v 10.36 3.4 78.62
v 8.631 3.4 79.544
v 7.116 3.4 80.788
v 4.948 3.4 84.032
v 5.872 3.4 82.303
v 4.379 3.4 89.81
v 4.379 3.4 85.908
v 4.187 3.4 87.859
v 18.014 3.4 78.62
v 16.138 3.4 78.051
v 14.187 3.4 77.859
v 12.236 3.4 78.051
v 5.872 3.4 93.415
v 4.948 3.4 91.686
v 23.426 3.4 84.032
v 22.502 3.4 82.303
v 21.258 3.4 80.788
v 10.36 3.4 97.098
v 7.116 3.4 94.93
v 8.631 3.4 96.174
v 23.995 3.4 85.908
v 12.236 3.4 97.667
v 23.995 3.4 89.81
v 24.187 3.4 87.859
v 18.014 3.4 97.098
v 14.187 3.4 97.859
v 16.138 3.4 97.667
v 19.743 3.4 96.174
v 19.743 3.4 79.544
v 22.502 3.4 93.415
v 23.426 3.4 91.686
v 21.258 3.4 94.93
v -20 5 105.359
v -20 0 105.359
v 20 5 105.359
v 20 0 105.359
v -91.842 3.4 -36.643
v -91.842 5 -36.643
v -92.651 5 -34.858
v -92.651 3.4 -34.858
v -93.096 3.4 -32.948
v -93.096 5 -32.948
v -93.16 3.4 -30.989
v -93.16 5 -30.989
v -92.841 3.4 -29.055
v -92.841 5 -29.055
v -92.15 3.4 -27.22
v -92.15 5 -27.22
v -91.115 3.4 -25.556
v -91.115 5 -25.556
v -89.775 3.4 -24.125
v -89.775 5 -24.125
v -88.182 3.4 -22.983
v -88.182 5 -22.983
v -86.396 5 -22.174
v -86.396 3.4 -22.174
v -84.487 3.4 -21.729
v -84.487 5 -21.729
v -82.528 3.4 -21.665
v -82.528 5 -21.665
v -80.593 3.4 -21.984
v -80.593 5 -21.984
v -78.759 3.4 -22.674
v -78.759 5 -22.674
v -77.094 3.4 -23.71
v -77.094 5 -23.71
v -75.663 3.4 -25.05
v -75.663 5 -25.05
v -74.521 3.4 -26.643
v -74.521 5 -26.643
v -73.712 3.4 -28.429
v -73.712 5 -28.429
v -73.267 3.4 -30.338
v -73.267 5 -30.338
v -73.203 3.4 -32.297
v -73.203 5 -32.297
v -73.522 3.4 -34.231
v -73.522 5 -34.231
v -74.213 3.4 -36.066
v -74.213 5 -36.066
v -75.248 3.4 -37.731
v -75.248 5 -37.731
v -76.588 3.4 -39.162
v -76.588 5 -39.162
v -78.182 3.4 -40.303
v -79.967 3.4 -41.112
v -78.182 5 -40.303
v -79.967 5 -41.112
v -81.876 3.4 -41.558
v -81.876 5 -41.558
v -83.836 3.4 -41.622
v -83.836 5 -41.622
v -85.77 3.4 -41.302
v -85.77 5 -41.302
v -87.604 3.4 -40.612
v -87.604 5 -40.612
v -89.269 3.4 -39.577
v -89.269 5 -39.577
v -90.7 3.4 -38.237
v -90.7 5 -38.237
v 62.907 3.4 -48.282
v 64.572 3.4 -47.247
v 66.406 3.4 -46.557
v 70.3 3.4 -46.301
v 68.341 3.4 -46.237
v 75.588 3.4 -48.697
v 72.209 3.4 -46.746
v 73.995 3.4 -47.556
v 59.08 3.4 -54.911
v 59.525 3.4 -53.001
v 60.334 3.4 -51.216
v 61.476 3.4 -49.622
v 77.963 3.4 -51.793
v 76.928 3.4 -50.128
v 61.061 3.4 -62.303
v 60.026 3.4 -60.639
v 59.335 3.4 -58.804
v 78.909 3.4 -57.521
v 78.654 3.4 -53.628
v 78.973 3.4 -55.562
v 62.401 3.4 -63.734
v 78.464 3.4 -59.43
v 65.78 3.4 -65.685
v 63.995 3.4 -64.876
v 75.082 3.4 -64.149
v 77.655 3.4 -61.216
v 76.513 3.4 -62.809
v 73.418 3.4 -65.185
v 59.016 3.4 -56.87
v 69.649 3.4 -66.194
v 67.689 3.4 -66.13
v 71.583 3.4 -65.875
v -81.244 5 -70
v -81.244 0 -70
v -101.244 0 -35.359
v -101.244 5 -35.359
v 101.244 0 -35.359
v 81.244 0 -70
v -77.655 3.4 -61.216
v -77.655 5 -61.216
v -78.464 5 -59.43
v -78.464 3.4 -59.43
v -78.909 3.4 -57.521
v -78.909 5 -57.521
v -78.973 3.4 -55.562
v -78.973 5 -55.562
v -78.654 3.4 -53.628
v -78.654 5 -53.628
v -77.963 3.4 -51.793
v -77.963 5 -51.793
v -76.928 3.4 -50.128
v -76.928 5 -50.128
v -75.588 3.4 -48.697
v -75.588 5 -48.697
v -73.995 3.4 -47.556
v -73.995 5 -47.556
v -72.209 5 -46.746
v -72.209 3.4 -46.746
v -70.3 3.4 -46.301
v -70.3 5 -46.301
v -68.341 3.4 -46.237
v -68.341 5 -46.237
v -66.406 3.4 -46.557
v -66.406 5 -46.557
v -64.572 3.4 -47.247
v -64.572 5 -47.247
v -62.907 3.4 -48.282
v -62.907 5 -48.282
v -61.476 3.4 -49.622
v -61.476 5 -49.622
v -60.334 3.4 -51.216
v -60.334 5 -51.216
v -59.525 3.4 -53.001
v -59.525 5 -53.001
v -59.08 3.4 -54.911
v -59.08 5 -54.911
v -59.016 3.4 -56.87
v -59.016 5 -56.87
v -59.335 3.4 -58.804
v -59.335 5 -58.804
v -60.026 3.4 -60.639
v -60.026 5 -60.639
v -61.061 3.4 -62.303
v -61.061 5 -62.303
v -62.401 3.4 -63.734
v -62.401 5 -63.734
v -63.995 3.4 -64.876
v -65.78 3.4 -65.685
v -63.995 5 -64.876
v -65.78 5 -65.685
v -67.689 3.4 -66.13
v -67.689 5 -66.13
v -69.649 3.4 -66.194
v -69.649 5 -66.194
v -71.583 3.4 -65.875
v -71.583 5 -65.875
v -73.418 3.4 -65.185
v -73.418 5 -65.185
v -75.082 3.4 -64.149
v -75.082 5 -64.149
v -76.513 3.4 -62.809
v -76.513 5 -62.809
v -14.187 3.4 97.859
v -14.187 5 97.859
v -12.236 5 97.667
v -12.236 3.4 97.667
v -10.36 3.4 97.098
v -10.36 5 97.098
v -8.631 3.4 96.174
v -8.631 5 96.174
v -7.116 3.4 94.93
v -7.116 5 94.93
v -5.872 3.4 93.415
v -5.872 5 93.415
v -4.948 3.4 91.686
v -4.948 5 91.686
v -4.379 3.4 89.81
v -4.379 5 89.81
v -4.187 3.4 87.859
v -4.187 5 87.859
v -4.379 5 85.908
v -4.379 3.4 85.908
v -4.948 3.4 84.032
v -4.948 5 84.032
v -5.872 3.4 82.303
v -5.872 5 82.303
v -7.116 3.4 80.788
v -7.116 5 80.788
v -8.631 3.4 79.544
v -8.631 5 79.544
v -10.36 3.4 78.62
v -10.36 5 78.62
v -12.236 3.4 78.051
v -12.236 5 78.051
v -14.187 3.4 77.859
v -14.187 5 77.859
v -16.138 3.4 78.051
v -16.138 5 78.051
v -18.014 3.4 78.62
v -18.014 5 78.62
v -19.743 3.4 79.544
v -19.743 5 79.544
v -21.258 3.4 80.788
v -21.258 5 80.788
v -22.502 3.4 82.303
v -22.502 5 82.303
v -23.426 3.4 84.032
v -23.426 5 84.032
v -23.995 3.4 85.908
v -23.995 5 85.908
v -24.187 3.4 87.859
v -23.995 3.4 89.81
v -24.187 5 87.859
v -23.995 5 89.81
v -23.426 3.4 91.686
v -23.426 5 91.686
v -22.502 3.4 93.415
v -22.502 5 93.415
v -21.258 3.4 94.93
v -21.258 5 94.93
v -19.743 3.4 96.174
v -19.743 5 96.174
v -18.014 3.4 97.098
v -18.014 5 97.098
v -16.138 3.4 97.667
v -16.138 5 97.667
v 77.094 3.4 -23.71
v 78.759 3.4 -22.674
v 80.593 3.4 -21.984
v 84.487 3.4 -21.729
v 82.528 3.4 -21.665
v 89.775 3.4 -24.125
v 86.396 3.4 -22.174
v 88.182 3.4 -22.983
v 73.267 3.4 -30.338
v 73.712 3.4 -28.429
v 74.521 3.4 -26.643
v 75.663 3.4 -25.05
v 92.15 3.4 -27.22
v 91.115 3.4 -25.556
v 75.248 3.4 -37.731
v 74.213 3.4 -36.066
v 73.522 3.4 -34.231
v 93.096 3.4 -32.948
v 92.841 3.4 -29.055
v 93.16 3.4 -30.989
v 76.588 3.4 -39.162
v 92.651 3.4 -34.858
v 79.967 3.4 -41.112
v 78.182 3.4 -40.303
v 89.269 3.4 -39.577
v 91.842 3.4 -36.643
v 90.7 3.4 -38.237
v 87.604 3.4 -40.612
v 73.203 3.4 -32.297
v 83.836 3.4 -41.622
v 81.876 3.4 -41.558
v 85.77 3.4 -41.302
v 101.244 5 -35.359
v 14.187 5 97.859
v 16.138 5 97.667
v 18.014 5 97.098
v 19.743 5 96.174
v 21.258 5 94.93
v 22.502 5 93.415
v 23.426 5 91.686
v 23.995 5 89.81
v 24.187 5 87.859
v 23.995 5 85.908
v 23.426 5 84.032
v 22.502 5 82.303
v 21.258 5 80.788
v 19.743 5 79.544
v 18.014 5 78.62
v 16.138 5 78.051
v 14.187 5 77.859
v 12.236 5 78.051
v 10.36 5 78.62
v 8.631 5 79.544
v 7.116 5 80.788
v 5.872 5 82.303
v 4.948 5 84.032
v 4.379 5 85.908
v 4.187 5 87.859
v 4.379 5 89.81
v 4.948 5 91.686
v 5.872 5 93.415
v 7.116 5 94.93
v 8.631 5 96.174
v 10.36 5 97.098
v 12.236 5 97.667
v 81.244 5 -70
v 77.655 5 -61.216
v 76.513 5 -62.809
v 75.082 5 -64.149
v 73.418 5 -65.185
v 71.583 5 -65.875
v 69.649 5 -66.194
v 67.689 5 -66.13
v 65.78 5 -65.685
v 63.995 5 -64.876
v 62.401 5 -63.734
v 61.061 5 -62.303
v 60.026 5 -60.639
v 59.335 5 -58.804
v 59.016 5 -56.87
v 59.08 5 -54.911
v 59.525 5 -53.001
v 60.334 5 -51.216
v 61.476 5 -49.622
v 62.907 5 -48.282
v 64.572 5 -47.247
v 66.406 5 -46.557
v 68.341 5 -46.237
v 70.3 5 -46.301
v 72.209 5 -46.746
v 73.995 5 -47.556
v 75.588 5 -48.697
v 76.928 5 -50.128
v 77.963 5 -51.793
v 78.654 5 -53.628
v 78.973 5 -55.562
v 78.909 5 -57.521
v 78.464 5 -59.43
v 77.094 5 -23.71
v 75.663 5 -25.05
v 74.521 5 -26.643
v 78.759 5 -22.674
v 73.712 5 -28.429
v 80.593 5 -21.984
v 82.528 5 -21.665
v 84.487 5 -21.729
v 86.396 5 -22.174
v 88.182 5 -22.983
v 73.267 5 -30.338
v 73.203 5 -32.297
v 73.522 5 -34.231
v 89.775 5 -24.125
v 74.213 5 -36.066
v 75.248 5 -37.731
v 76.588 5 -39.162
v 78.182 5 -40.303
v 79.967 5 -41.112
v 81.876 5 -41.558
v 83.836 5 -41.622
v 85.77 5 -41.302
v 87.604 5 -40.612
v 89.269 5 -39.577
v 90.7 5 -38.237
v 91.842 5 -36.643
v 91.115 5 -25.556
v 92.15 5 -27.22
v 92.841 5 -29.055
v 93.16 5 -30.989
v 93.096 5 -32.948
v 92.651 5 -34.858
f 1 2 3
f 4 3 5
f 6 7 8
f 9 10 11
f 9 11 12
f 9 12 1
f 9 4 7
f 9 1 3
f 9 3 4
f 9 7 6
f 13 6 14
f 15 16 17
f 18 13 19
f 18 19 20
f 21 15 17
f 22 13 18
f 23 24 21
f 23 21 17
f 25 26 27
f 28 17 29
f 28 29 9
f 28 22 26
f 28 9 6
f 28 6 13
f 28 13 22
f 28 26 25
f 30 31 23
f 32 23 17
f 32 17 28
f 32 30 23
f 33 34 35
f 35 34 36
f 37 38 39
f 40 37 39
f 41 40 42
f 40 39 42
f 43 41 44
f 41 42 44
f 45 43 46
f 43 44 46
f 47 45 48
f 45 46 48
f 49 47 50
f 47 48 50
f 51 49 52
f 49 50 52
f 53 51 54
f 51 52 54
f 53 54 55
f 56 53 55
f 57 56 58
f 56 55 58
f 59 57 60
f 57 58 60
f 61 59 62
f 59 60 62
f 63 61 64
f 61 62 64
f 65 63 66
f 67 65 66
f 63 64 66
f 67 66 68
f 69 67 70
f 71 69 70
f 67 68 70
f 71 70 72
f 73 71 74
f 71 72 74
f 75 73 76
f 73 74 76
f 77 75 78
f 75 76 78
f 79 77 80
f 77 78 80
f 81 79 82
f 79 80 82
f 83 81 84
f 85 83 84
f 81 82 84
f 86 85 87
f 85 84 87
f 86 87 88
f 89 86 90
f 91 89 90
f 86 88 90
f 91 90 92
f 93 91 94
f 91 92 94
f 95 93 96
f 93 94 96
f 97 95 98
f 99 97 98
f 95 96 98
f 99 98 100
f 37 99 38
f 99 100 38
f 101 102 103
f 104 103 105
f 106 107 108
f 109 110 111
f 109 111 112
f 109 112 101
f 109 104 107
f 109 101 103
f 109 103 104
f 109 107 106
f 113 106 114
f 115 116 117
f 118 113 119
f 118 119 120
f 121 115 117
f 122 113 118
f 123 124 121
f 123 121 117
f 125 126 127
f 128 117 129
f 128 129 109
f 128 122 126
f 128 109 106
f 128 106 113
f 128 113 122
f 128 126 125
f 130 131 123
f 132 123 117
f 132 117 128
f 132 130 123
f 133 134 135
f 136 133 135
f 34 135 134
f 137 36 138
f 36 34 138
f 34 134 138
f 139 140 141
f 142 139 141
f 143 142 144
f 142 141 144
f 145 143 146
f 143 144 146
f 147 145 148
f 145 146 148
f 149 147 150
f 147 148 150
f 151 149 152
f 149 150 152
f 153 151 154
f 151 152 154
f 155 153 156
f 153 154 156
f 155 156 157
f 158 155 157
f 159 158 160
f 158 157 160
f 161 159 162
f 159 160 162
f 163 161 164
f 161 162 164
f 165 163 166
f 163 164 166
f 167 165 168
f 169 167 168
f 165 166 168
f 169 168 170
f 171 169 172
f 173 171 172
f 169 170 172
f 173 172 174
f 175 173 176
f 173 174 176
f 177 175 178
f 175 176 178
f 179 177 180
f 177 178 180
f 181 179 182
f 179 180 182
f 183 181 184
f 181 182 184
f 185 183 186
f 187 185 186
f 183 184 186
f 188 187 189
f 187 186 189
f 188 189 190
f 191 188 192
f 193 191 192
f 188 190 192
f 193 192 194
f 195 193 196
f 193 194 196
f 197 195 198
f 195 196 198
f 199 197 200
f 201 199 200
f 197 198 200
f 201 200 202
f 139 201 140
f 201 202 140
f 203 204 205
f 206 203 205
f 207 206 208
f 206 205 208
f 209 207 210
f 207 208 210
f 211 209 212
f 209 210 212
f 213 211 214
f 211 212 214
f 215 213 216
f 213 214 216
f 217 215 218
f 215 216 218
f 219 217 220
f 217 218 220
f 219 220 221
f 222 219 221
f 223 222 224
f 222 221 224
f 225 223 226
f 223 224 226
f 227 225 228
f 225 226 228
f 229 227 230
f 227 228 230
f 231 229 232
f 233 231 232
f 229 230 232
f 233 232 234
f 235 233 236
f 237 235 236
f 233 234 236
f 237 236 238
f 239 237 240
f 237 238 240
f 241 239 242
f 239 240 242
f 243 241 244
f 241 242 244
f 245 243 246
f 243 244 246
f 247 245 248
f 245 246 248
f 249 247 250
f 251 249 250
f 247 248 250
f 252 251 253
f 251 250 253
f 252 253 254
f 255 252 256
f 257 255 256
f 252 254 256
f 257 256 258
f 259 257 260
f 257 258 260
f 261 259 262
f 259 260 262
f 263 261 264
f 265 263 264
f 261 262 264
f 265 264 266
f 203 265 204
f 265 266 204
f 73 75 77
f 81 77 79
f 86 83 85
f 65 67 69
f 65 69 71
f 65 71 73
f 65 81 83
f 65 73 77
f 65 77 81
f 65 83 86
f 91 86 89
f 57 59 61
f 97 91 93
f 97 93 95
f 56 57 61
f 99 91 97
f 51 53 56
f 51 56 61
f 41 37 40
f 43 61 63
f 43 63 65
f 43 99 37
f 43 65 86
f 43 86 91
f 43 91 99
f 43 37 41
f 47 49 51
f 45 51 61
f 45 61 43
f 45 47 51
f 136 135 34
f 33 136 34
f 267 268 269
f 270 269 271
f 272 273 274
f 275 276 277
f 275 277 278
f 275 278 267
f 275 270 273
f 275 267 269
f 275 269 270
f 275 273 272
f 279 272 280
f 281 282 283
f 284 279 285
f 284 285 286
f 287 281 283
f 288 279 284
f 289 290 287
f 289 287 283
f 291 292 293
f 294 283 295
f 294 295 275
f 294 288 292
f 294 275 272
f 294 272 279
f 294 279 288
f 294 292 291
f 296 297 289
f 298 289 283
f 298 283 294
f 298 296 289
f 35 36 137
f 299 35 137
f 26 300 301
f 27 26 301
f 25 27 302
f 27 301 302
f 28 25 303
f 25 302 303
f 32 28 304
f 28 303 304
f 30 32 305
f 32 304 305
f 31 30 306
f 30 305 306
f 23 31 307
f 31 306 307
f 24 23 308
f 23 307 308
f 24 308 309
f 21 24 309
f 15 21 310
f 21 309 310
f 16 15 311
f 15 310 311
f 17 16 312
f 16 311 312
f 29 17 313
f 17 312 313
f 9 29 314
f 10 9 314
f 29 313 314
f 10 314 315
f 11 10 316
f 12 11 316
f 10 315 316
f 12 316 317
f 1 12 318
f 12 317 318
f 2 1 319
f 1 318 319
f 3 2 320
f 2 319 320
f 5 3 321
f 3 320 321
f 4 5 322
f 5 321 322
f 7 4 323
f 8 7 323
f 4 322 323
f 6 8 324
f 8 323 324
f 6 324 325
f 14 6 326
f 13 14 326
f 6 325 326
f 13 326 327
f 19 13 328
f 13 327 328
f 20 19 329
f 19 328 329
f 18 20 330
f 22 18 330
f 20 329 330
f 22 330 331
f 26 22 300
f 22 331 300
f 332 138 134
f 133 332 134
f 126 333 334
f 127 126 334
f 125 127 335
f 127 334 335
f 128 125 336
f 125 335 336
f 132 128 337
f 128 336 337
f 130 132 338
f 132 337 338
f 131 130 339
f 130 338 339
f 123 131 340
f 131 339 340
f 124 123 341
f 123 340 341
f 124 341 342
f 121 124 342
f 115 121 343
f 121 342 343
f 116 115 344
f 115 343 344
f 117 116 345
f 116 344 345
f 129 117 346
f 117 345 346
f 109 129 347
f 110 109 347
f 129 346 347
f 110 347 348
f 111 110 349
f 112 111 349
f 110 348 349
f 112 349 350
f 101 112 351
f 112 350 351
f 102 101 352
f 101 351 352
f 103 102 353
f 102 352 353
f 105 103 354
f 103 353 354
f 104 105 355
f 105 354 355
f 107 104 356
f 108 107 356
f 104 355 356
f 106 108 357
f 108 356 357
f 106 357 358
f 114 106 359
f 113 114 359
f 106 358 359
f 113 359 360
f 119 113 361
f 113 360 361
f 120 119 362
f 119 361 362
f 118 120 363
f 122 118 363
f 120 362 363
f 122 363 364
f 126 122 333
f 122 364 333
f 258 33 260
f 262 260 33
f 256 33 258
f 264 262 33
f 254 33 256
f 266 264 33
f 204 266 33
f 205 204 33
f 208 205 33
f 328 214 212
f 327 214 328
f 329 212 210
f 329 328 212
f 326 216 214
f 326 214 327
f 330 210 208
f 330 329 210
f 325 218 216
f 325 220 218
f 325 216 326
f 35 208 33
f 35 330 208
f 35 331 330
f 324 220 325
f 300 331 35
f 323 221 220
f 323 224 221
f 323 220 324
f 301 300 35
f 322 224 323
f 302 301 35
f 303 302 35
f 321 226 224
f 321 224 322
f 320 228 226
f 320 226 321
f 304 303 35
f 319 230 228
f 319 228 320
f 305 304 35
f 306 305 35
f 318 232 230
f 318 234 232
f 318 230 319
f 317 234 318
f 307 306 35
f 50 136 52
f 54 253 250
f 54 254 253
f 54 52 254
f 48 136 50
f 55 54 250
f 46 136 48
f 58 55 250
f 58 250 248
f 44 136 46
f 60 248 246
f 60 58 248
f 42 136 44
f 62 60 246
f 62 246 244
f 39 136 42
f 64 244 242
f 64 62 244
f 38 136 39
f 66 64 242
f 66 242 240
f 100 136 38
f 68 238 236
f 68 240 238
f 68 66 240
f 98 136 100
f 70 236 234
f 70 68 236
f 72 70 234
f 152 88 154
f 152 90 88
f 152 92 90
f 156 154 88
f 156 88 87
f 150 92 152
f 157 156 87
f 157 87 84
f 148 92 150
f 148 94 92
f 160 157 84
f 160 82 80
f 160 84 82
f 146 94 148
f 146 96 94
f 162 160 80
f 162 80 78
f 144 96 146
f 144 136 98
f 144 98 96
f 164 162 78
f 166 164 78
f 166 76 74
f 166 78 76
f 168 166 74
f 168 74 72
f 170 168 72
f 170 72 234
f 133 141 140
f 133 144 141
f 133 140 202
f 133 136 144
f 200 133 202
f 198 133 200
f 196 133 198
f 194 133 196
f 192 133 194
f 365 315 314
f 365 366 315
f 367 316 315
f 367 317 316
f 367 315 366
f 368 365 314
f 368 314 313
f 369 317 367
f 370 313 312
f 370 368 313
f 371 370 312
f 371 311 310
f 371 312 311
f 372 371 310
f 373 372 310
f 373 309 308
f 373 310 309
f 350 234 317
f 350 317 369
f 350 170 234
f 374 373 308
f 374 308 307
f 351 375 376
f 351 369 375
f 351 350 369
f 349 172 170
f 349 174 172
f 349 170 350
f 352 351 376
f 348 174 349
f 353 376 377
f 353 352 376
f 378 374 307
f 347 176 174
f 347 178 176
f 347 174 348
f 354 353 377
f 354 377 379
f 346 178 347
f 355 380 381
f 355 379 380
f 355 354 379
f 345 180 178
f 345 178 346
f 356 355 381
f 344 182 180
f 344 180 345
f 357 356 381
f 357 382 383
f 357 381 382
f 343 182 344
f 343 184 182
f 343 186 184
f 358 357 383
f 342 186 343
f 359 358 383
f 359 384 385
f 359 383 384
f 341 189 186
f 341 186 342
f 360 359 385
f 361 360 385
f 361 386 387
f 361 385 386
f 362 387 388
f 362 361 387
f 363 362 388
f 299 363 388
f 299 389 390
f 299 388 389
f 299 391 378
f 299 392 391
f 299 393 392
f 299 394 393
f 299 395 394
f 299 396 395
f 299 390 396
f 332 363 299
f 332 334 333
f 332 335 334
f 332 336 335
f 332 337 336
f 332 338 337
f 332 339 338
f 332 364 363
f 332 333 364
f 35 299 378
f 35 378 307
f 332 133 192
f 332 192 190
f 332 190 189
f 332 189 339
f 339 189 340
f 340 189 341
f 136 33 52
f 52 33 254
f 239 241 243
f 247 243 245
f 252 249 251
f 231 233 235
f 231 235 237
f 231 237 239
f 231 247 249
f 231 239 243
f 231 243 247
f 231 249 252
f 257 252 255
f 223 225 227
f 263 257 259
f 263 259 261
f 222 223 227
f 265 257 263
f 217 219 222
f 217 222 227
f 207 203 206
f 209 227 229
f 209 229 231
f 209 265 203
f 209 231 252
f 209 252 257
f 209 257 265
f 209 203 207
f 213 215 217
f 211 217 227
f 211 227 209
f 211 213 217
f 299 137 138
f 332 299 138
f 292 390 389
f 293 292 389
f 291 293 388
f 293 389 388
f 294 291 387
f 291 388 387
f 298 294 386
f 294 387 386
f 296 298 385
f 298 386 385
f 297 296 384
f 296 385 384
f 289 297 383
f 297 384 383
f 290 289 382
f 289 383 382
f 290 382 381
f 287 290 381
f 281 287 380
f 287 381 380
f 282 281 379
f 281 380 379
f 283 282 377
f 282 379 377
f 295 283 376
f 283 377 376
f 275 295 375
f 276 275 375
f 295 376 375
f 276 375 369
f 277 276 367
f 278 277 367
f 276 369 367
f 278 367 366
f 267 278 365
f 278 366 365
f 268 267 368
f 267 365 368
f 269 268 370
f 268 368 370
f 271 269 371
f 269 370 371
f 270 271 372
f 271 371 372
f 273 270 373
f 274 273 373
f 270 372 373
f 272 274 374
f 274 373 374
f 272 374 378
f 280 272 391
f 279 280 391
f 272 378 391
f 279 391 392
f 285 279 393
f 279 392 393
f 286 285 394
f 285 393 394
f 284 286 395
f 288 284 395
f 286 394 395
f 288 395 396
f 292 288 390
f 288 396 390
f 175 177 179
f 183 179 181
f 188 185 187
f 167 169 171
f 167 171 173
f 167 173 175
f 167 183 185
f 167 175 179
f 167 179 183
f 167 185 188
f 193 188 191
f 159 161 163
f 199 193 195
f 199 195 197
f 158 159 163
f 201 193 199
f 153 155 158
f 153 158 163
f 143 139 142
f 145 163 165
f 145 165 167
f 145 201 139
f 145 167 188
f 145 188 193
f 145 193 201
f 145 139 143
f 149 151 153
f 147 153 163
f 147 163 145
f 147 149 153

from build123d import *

# Parameters (mm, degrees)
BOSS_EXTRUDE1_DEPTH = 5
CUT_EXTRUDE4_START  = 5
SKETCH1_5_R         = 10
CUT_EXTRUDE4_DEPTH  = 1.6
CIRPATTERN1_COUNT   = 3


with BuildPart() as part:
    # Sketch1 → Boss-Extrude1 (new body)
    with BuildSketch(Plane(origin=(0, 0, 0), x_dir=(1, 0, 0), z_dir=(0, 1, 0))):
        Polygon((20, -105.358983849), (101.24355653, 35.358983849), (81.24355653, 70), (-81.24355653, 70), (-101.24355653, 35.358983849), (-20, -105.358983849), align=None)
    extrude(amount=BOSS_EXTRUDE1_DEPTH)

    # Sketch1<5> → Cut-Extrude4 (cut)
    with BuildSketch(Plane(origin=(0, 0, 0), x_dir=(1, 0, 0), z_dir=(0, 1, 0)).offset(CUT_EXTRUDE4_START)):
        with Locations(Location((-14.186994533, -87.858983849, 0), (0, 0, 270))):
            Circle(SKETCH1_5_R)
        with Locations(Location((14.186994533, -87.858983849, 0), (0, 0, 270))):
            Circle(SKETCH1_5_R)
    cut_extrude4 = extrude(amount=-CUT_EXTRUDE4_DEPTH, mode=Mode.SUBTRACT)

    # CirPattern1: Cut-Extrude4 ×3 about axis
    cirpattern1_axis = Axis((0, 0, 0), (0, 1, 0))
    for i in range(1, CIRPATTERN1_COUNT):
        add(cut_extrude4.rotate(cirpattern1_axis, i * 360 / CIRPATTERN1_COUNT), mode=Mode.SUBTRACT)


solid = part.part
